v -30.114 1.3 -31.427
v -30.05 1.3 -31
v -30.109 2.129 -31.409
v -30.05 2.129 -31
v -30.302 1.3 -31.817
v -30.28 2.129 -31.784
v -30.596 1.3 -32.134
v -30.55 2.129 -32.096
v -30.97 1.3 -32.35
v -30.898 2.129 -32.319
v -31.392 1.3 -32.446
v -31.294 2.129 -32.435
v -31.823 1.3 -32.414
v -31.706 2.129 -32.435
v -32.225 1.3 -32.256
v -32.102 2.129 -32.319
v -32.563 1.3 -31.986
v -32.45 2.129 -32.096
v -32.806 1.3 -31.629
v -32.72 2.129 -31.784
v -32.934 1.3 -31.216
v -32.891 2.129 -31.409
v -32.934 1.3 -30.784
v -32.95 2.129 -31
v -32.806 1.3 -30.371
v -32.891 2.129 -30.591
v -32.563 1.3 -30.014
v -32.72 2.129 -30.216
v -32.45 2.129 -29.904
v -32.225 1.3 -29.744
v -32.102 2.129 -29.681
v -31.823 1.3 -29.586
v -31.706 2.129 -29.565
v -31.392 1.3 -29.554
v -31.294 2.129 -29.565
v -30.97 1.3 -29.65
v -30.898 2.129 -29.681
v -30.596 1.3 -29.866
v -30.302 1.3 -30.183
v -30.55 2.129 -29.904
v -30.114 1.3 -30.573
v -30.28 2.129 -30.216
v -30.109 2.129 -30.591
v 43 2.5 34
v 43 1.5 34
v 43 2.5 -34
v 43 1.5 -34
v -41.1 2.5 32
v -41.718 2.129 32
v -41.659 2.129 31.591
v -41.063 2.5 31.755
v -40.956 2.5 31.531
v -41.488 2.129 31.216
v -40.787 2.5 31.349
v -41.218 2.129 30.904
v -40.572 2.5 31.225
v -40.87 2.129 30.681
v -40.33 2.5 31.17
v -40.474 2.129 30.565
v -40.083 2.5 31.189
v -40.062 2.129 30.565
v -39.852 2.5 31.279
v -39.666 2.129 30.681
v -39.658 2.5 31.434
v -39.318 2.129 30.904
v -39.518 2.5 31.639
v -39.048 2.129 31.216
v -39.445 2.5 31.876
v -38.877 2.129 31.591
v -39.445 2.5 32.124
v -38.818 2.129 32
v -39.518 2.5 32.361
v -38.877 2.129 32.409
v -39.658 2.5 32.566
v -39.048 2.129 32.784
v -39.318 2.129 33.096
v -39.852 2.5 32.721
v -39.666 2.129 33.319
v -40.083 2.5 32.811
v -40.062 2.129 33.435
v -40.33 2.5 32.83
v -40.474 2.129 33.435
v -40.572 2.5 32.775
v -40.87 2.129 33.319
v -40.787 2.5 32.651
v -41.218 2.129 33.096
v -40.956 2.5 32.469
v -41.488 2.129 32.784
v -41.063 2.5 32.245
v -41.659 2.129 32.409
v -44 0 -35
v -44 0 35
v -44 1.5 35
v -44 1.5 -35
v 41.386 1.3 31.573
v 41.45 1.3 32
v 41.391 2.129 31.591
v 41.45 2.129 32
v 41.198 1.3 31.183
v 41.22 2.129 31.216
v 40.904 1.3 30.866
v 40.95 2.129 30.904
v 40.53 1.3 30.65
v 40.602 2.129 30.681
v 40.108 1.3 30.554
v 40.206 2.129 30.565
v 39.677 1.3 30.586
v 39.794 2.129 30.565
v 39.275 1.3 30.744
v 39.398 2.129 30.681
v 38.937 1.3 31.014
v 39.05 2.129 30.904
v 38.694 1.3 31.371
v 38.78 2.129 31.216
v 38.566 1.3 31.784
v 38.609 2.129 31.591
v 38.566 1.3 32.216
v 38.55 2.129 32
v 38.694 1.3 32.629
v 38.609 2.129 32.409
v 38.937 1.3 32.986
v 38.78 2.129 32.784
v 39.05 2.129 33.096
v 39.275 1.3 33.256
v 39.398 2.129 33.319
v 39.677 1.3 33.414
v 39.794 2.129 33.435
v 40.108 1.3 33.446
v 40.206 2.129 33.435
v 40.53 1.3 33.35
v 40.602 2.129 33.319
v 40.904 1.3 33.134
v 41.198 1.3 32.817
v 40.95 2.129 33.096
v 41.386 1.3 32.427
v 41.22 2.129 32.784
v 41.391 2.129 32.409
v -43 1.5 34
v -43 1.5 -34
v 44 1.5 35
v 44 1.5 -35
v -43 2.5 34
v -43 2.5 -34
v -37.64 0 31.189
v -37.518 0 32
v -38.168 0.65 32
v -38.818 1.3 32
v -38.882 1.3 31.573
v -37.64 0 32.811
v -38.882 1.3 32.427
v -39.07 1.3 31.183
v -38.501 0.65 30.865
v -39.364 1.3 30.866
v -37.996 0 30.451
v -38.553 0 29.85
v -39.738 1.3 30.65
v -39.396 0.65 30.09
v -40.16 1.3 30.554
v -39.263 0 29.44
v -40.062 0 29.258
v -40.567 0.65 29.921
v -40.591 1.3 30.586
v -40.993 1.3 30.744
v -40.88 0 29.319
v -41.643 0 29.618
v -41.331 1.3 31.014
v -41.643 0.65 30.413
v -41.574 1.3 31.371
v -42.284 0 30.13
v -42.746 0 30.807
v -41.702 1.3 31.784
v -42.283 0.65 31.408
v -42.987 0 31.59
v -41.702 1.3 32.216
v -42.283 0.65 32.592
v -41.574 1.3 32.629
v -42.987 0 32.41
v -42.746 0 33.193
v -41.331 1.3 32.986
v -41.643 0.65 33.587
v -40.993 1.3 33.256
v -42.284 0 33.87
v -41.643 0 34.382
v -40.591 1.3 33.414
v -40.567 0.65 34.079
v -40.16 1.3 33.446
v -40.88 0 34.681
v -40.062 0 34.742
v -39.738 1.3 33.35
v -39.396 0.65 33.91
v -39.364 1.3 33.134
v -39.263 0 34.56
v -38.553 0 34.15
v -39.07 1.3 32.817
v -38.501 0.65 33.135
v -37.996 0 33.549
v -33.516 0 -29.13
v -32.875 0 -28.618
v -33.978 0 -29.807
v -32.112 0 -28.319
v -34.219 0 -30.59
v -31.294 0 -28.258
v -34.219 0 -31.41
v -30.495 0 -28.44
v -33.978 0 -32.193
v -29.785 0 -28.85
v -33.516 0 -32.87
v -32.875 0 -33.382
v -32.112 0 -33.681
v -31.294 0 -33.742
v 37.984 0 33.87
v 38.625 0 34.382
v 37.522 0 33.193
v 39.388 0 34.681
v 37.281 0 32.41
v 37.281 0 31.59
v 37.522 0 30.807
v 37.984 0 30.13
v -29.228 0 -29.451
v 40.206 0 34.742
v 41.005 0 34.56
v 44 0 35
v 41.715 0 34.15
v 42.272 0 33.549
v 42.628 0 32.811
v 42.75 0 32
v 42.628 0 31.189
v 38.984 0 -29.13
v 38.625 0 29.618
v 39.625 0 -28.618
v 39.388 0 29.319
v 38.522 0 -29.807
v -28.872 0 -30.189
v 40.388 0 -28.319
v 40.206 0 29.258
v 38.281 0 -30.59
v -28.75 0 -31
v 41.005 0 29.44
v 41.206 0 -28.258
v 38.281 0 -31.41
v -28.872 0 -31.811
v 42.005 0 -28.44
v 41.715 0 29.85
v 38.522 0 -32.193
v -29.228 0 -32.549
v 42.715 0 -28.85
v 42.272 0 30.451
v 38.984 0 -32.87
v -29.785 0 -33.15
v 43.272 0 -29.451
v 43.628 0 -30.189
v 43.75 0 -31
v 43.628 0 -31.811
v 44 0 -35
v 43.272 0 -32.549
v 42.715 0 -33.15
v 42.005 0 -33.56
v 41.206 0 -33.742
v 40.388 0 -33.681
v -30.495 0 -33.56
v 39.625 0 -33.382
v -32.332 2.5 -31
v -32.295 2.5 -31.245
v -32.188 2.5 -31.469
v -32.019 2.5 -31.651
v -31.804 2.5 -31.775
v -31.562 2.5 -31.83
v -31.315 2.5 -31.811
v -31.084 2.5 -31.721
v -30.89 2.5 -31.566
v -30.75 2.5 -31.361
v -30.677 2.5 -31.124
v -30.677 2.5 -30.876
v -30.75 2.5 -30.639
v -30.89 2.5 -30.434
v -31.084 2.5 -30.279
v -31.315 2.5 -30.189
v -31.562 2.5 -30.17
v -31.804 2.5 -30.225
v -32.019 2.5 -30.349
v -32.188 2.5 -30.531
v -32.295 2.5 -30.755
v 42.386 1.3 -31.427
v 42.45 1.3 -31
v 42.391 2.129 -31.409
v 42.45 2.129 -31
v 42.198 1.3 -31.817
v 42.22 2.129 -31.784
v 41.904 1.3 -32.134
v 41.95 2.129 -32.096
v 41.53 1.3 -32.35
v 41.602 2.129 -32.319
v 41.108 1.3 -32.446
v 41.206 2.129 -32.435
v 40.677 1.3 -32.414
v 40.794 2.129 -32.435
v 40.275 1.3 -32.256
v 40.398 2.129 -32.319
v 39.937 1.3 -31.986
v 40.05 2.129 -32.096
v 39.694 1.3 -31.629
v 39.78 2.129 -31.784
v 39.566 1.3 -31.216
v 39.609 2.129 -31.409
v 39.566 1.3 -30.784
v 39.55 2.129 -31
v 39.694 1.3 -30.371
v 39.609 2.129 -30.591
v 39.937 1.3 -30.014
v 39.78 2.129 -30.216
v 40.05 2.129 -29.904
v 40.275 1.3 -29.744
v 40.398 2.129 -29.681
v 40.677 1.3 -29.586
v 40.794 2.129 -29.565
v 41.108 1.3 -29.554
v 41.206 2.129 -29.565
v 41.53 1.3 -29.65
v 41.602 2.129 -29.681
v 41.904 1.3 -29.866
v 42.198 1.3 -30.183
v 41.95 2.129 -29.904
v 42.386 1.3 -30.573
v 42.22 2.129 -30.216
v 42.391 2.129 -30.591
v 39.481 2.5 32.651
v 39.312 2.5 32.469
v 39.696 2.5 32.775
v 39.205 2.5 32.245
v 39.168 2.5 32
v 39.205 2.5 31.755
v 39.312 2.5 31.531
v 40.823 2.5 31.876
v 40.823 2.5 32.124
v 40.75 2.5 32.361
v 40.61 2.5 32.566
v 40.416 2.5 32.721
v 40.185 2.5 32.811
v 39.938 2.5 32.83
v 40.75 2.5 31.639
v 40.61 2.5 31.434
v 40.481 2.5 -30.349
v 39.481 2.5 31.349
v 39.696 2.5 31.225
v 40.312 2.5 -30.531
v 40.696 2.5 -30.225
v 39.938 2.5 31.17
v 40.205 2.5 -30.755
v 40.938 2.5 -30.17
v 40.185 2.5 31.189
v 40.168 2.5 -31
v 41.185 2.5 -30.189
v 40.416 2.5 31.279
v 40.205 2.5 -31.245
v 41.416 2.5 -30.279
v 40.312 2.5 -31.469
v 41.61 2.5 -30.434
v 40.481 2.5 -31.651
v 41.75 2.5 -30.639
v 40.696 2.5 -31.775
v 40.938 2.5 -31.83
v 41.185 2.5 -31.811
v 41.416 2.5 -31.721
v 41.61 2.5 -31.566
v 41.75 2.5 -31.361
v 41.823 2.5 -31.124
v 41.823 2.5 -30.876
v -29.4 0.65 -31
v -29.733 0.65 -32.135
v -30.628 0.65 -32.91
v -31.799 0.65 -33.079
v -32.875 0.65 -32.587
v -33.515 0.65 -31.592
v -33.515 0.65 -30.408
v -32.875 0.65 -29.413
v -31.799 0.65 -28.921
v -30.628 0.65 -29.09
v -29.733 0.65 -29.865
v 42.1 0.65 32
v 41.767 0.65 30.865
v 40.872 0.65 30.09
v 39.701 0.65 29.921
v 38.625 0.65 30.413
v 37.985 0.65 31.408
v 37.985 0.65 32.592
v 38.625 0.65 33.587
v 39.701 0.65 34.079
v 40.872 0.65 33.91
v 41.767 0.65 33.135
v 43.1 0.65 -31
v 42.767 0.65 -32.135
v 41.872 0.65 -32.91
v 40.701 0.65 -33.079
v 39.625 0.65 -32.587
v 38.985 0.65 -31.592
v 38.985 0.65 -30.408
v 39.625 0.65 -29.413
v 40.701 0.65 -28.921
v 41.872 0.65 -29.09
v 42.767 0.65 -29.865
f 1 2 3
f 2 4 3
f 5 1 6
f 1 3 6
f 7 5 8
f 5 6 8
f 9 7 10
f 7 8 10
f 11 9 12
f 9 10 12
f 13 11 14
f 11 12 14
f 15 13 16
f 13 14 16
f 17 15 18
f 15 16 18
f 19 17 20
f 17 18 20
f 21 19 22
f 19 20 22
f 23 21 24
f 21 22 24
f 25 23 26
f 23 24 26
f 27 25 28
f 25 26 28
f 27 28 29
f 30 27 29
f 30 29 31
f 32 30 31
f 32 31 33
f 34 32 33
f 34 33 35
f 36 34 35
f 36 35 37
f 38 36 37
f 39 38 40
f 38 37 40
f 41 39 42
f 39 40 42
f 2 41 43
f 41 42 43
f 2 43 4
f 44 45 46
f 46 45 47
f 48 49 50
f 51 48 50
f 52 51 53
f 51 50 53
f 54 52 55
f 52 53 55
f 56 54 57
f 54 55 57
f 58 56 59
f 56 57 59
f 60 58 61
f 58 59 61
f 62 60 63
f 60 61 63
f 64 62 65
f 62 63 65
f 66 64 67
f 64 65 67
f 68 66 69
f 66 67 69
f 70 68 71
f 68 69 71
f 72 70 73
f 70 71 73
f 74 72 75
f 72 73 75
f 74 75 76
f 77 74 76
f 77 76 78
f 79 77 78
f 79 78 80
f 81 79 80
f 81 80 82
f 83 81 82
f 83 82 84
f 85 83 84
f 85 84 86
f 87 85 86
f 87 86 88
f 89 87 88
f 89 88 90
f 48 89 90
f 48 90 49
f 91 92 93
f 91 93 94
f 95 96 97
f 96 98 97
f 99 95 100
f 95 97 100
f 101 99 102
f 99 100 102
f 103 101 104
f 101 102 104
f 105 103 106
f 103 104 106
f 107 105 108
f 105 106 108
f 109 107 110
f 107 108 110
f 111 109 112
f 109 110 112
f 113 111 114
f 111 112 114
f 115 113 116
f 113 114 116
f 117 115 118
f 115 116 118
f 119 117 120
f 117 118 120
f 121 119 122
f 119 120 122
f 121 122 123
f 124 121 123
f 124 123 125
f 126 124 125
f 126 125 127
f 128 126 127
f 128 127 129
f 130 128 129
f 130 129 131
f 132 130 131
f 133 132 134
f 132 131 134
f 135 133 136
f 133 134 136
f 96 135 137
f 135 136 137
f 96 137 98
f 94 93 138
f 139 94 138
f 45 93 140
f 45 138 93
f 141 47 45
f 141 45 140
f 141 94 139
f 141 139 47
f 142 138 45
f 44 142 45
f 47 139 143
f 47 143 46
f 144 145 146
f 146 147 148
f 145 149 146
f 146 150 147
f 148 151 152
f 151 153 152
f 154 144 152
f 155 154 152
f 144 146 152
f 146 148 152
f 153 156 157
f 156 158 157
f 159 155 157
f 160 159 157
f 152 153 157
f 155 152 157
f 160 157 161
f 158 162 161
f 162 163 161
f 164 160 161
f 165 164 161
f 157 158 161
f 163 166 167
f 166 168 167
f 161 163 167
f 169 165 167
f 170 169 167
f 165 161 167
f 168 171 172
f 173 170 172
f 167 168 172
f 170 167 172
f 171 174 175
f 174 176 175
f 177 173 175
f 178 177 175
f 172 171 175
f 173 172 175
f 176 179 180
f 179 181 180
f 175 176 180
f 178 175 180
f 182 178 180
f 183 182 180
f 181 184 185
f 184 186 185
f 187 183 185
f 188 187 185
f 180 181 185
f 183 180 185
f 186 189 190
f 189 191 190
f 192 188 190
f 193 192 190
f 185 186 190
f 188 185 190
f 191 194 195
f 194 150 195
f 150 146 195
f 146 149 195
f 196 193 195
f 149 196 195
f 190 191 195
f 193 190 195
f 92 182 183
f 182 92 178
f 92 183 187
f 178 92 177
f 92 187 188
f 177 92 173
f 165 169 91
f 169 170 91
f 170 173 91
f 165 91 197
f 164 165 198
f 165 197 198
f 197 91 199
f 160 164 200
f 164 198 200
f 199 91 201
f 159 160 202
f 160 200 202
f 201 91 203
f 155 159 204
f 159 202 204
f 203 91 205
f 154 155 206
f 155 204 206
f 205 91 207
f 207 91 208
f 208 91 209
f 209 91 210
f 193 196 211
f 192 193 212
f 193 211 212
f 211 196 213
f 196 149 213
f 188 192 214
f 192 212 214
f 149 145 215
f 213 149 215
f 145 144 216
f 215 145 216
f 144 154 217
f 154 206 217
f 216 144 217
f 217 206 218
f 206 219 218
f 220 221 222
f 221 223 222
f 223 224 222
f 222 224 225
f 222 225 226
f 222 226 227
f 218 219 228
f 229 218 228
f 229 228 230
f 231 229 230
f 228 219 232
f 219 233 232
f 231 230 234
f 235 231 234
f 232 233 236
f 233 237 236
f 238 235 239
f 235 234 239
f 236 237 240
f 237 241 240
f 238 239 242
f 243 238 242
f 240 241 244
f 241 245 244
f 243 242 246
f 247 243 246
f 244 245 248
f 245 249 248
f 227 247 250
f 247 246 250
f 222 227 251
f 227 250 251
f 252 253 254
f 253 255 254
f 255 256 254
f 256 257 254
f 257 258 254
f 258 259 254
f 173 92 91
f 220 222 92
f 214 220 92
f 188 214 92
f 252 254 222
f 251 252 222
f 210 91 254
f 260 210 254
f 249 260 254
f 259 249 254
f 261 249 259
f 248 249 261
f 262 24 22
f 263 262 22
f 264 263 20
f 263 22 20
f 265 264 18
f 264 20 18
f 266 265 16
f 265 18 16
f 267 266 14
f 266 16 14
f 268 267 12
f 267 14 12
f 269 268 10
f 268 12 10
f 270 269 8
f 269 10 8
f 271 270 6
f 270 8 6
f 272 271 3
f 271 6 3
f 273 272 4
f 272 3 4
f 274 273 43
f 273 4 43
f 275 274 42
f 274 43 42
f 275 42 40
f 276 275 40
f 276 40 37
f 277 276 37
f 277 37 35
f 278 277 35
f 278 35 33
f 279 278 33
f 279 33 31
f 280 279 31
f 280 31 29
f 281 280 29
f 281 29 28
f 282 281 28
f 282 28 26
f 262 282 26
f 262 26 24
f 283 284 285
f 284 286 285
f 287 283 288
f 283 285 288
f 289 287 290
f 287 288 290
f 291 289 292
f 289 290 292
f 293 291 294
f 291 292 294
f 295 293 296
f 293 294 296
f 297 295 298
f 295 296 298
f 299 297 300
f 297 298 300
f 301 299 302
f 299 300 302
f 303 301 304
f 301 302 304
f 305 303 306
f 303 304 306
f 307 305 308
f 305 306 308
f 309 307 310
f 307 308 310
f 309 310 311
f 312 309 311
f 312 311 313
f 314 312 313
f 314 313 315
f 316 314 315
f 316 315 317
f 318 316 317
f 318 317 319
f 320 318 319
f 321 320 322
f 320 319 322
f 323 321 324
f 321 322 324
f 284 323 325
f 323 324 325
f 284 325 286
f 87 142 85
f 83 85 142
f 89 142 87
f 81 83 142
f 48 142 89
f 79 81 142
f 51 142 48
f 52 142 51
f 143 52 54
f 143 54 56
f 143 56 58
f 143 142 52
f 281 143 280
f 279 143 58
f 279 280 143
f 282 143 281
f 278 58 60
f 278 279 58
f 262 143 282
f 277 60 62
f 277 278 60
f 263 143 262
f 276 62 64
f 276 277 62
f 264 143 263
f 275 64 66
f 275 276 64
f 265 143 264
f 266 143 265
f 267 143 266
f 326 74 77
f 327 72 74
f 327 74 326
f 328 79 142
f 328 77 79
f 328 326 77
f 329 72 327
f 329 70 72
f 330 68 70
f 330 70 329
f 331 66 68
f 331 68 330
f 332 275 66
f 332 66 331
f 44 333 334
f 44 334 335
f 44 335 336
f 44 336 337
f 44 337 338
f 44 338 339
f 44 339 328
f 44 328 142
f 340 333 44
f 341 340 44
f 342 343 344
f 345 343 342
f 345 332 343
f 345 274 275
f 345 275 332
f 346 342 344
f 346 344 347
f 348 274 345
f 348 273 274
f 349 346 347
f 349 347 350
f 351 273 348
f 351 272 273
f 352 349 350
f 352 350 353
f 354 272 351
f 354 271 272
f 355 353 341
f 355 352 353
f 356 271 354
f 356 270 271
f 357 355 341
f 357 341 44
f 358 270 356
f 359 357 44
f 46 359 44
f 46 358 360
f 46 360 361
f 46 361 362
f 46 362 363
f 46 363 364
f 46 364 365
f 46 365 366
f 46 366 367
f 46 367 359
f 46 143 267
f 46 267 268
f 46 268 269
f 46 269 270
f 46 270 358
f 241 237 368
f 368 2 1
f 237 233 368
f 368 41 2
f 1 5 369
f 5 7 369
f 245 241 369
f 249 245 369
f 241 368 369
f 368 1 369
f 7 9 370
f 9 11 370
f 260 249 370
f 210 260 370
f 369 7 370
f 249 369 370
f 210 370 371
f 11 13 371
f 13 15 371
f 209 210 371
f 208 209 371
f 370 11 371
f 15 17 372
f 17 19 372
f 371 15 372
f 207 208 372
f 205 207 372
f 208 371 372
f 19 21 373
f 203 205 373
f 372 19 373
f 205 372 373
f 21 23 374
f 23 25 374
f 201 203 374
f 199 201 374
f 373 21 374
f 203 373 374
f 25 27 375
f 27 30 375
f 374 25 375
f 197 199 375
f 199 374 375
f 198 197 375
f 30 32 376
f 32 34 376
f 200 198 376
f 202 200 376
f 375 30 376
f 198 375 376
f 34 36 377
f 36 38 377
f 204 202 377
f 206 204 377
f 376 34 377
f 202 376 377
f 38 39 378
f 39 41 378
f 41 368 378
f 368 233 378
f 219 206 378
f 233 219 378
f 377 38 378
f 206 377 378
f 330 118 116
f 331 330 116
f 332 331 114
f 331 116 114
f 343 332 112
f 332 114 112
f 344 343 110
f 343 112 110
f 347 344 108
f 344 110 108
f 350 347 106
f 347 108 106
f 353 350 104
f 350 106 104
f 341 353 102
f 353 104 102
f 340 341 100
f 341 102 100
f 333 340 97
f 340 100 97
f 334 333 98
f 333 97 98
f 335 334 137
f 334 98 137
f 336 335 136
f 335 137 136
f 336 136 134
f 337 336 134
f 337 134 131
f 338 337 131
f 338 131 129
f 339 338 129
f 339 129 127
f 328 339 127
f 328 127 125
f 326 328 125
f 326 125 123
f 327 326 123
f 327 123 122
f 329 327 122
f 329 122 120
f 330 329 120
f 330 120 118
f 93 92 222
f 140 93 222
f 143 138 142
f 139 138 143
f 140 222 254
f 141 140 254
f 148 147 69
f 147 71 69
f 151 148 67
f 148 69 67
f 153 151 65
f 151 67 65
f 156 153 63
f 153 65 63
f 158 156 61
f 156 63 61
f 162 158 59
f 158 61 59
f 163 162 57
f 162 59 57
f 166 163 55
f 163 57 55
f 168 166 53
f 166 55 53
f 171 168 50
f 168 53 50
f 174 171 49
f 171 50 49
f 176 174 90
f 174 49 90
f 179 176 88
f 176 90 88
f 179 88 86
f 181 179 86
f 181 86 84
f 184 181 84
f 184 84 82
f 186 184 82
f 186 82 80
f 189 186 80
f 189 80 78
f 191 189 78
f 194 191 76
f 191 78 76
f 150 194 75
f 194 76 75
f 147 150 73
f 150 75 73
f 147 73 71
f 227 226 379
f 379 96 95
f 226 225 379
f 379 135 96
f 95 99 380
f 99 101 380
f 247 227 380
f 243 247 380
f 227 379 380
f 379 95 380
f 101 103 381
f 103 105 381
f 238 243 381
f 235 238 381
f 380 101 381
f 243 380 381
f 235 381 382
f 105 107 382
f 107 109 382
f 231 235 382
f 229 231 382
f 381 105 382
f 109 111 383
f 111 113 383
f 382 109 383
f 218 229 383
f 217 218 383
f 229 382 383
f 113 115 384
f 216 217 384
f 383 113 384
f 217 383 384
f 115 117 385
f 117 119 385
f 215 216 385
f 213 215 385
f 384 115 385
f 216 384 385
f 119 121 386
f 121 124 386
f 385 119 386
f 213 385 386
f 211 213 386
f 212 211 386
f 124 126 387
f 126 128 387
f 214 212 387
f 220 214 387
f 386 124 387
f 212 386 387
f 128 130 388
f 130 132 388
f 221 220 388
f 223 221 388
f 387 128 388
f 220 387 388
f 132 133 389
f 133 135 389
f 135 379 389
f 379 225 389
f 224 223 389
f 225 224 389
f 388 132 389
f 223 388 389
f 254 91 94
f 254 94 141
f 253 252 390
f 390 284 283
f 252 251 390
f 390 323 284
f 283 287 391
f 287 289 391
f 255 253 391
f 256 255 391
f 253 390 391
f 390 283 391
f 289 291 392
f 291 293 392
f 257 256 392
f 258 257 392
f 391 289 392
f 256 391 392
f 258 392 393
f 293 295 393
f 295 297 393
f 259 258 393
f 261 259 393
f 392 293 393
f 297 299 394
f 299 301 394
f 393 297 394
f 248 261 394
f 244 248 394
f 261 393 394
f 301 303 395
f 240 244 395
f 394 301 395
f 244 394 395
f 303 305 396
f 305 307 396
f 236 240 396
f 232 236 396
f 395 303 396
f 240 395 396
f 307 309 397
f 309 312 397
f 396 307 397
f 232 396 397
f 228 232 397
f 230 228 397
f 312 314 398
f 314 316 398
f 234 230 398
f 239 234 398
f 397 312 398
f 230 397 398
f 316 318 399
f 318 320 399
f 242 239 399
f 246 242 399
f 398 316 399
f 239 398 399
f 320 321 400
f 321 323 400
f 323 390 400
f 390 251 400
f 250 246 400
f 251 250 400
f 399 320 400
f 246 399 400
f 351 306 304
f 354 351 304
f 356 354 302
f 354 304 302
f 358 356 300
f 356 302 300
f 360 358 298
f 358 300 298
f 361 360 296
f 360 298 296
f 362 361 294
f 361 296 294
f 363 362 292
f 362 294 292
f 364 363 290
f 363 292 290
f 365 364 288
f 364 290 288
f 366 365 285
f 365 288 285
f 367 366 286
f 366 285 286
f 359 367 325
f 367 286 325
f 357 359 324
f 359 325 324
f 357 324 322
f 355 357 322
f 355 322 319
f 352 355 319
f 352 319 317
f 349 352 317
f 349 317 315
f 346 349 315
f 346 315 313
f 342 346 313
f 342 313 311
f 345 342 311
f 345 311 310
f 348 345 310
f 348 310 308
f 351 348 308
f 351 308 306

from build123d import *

# Parameters (mm, degrees)
SKETCH1_W                                         = 88
SKETCH1_H                                         = 70
BOSS_EXTRUDE2_DEPTH                               = 1.5
SKETCH7_W                                         = 86
SKETCH7_H                                         = 68
BOSS_EXTRUDE3_DEPTH                               = 1
CSK_FOR_M2_5_FLAT_HEAD_MACHINE_SCREW1_D           = 2.9
CSK_FOR_M2_5_FLAT_HEAD_MACHINE_SCREW1_DEPTH       = 2.128752102
CSK_FOR_M2_5_FLAT_HEAD_MACHINE_SCREW1_CSINK_D     = 5.5
CSK_FOR_M2_5_FLAT_HEAD_MACHINE_SCREW1_CSINK_ANGLE = 90
CSK_FOR_M2_5_FLAT_HEAD_MACHINE_SCREW1_TIP         = 0.871247898


with BuildPart() as part:
    # Sketch1 → Boss-Extrude2 (new body)
    with BuildSketch(Plane(origin=(0, 0, 0), x_dir=(1, 0, 0), z_dir=(0, 1, 0))):
        Rectangle(SKETCH1_W, SKETCH1_H)
    extrude(amount=BOSS_EXTRUDE2_DEPTH)

    # Sketch7 → Boss-Extrude3 (add)
    with BuildSketch(Plane(origin=(0, 1.5, 0), x_dir=(1, 0, 0), z_dir=(0, 1, 0))):
        Rectangle(SKETCH7_W, SKETCH7_H)
    extrude(amount=BOSS_EXTRUDE3_DEPTH)

    # CSK for M2.5 Flat Head Machine Screw1
    with Locations(Plane(origin=(0, 0, 0), x_dir=(-1, 0, 0), z_dir=(0, -1, 0))):
        with Locations((-40, -32), (-41, 31), (31.5, 31), (40.268, -32)):
            CounterSinkHole(CSK_FOR_M2_5_FLAT_HEAD_MACHINE_SCREW1_D / 2, CSK_FOR_M2_5_FLAT_HEAD_MACHINE_SCREW1_CSINK_D / 2, depth=CSK_FOR_M2_5_FLAT_HEAD_MACHINE_SCREW1_DEPTH, counter_sink_angle=CSK_FOR_M2_5_FLAT_HEAD_MACHINE_SCREW1_CSINK_ANGLE)
            with Locations((0, 0, -(CSK_FOR_M2_5_FLAT_HEAD_MACHINE_SCREW1_DEPTH + CSK_FOR_M2_5_FLAT_HEAD_MACHINE_SCREW1_TIP / 2))):  # 118° drill point
                Cone(0, CSK_FOR_M2_5_FLAT_HEAD_MACHINE_SCREW1_D / 2, CSK_FOR_M2_5_FLAT_HEAD_MACHINE_SCREW1_TIP, mode=Mode.SUBTRACT)


solid = part.part
